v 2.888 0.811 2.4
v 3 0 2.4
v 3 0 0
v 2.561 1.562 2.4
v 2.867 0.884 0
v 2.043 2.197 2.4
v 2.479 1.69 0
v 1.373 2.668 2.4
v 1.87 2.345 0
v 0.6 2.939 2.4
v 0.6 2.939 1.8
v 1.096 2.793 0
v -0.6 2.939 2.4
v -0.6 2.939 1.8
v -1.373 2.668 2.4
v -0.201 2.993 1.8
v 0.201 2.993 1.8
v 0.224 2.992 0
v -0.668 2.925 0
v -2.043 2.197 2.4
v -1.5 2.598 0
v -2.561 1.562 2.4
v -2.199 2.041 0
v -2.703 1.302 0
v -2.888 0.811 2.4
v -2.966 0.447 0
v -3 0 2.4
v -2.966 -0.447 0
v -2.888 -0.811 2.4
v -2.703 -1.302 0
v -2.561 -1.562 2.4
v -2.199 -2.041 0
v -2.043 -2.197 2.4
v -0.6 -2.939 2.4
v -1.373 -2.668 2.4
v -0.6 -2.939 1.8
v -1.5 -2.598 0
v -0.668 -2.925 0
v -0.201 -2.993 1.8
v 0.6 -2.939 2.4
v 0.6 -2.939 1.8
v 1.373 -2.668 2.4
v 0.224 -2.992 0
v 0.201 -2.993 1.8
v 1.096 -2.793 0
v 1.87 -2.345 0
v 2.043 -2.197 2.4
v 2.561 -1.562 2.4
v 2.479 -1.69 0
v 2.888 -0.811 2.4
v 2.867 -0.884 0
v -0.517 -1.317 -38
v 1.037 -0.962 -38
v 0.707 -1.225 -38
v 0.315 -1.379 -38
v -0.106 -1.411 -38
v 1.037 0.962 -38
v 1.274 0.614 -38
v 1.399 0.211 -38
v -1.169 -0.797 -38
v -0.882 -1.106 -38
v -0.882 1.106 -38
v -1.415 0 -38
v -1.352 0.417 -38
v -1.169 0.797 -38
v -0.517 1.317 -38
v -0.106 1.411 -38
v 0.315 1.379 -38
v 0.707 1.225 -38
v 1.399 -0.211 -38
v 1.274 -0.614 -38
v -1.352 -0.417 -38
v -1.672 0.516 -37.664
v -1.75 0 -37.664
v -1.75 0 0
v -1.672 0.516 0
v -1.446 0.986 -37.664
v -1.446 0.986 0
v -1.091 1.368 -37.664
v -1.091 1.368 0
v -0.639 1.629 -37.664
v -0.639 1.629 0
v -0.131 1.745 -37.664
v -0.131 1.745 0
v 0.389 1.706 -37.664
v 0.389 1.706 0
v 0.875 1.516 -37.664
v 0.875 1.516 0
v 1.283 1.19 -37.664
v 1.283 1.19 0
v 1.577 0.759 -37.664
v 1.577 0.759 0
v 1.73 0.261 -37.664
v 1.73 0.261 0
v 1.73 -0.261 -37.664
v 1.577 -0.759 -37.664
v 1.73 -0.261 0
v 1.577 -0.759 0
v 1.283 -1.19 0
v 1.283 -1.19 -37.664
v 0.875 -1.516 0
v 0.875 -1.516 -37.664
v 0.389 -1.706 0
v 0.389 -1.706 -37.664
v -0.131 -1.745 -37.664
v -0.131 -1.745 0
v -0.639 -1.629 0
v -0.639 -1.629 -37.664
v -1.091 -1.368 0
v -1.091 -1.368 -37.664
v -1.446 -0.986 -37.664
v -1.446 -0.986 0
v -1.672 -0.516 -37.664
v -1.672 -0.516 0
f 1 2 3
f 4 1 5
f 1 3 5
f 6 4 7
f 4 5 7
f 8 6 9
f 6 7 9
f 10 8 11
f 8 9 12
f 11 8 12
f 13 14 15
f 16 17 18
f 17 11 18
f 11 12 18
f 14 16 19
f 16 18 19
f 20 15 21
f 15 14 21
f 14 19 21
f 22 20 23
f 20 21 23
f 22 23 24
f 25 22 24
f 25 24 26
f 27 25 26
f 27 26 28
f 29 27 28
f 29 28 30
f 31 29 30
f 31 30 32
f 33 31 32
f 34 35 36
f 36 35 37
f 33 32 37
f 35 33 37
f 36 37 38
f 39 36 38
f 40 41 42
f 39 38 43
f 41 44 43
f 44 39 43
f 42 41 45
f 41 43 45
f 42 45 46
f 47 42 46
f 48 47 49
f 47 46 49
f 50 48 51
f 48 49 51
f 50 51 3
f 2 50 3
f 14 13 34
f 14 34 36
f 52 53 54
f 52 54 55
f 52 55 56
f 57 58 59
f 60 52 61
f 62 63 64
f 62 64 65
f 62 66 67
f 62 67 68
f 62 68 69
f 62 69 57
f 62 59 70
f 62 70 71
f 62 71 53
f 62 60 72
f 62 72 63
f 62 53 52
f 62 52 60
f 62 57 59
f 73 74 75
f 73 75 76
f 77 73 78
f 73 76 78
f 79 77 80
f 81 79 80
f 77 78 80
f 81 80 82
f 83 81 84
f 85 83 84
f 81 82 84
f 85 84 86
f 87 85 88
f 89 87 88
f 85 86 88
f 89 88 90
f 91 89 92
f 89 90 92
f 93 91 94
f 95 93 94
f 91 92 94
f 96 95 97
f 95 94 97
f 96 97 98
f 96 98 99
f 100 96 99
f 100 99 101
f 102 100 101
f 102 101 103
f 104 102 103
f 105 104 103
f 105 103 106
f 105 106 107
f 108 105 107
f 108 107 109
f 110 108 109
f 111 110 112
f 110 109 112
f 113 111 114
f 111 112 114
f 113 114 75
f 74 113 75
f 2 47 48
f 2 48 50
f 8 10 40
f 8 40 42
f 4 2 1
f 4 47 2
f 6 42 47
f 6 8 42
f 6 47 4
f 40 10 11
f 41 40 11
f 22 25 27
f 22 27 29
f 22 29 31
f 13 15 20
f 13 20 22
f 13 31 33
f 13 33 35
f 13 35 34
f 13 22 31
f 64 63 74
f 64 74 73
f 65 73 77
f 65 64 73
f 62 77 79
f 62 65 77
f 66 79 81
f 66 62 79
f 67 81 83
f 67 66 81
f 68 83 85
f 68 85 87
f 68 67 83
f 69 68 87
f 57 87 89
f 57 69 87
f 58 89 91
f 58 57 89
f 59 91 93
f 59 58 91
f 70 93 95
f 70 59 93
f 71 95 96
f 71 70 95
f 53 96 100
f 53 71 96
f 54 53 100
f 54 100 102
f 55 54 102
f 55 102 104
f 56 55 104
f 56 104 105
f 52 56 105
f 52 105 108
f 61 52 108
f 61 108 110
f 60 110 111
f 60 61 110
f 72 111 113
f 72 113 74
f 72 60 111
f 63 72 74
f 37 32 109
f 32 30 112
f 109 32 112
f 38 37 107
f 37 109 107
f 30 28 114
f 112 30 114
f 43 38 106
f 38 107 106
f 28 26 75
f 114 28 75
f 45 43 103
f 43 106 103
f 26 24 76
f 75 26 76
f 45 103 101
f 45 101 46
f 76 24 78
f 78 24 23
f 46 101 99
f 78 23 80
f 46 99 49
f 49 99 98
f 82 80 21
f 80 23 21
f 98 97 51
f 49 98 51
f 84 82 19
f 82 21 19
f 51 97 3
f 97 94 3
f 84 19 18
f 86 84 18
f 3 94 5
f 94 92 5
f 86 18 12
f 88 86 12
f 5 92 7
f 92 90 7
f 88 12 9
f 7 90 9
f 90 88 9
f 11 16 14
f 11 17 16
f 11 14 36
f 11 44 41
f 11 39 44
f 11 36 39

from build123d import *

# Parameters (mm, degrees)
SKETCH_1_R               = 3
EXTRUDE_1_DEPTH          = 2.4
SKETCH_2_R               = 1.75
EXTRUDE_2_DEPTH          = 38
CHAMFER_1_SIZE           = 0.3355
CUT_EXTRUDE_1_DEPTH      = 38
CUT_EXTRUDE_1_DEPTH_BACK = 38
SKETCH_3_W               = 1.2
SKETCH_3_H               = 1.2


with BuildPart() as part:
    # Эскиз1 → Бобышка-Вытянуть1 (new body)
    with BuildSketch(Plane.XY):
        Circle(SKETCH_1_R)
    extrude(amount=EXTRUDE_1_DEPTH)

    # Эскиз2 → Бобышка-Вытянуть2 (add)
    with BuildSketch(Plane(origin=(0, 0, 0), x_dir=(-1, 0, 0), z_dir=(0, 0, -1))):
        Circle(SKETCH_2_R)
    extrude(amount=EXTRUDE_2_DEPTH)

    # Фаска1
    chamfer_1_edges = [part.edges().sort_by_distance(p)[0] for p in [
        (1.75, 0, -38),
    ]]
    chamfer(chamfer_1_edges, length=CHAMFER_1_SIZE)

    # Эскиз3 → Вырез-Вытянуть1 (cut, two sides: drawn at the far end of the back side and taken through both)
    with BuildSketch(Plane(origin=(0, 0, 0), x_dir=(1, 0, 0), z_dir=(0, 1, 0)).offset(-CUT_EXTRUDE_1_DEPTH_BACK)):
        with Locations((0, -2.4)):
            Rectangle(SKETCH_3_W, SKETCH_3_H)
    extrude(amount=CUT_EXTRUDE_1_DEPTH + CUT_EXTRUDE_1_DEPTH_BACK, mode=Mode.SUBTRACT)


solid = part.part
